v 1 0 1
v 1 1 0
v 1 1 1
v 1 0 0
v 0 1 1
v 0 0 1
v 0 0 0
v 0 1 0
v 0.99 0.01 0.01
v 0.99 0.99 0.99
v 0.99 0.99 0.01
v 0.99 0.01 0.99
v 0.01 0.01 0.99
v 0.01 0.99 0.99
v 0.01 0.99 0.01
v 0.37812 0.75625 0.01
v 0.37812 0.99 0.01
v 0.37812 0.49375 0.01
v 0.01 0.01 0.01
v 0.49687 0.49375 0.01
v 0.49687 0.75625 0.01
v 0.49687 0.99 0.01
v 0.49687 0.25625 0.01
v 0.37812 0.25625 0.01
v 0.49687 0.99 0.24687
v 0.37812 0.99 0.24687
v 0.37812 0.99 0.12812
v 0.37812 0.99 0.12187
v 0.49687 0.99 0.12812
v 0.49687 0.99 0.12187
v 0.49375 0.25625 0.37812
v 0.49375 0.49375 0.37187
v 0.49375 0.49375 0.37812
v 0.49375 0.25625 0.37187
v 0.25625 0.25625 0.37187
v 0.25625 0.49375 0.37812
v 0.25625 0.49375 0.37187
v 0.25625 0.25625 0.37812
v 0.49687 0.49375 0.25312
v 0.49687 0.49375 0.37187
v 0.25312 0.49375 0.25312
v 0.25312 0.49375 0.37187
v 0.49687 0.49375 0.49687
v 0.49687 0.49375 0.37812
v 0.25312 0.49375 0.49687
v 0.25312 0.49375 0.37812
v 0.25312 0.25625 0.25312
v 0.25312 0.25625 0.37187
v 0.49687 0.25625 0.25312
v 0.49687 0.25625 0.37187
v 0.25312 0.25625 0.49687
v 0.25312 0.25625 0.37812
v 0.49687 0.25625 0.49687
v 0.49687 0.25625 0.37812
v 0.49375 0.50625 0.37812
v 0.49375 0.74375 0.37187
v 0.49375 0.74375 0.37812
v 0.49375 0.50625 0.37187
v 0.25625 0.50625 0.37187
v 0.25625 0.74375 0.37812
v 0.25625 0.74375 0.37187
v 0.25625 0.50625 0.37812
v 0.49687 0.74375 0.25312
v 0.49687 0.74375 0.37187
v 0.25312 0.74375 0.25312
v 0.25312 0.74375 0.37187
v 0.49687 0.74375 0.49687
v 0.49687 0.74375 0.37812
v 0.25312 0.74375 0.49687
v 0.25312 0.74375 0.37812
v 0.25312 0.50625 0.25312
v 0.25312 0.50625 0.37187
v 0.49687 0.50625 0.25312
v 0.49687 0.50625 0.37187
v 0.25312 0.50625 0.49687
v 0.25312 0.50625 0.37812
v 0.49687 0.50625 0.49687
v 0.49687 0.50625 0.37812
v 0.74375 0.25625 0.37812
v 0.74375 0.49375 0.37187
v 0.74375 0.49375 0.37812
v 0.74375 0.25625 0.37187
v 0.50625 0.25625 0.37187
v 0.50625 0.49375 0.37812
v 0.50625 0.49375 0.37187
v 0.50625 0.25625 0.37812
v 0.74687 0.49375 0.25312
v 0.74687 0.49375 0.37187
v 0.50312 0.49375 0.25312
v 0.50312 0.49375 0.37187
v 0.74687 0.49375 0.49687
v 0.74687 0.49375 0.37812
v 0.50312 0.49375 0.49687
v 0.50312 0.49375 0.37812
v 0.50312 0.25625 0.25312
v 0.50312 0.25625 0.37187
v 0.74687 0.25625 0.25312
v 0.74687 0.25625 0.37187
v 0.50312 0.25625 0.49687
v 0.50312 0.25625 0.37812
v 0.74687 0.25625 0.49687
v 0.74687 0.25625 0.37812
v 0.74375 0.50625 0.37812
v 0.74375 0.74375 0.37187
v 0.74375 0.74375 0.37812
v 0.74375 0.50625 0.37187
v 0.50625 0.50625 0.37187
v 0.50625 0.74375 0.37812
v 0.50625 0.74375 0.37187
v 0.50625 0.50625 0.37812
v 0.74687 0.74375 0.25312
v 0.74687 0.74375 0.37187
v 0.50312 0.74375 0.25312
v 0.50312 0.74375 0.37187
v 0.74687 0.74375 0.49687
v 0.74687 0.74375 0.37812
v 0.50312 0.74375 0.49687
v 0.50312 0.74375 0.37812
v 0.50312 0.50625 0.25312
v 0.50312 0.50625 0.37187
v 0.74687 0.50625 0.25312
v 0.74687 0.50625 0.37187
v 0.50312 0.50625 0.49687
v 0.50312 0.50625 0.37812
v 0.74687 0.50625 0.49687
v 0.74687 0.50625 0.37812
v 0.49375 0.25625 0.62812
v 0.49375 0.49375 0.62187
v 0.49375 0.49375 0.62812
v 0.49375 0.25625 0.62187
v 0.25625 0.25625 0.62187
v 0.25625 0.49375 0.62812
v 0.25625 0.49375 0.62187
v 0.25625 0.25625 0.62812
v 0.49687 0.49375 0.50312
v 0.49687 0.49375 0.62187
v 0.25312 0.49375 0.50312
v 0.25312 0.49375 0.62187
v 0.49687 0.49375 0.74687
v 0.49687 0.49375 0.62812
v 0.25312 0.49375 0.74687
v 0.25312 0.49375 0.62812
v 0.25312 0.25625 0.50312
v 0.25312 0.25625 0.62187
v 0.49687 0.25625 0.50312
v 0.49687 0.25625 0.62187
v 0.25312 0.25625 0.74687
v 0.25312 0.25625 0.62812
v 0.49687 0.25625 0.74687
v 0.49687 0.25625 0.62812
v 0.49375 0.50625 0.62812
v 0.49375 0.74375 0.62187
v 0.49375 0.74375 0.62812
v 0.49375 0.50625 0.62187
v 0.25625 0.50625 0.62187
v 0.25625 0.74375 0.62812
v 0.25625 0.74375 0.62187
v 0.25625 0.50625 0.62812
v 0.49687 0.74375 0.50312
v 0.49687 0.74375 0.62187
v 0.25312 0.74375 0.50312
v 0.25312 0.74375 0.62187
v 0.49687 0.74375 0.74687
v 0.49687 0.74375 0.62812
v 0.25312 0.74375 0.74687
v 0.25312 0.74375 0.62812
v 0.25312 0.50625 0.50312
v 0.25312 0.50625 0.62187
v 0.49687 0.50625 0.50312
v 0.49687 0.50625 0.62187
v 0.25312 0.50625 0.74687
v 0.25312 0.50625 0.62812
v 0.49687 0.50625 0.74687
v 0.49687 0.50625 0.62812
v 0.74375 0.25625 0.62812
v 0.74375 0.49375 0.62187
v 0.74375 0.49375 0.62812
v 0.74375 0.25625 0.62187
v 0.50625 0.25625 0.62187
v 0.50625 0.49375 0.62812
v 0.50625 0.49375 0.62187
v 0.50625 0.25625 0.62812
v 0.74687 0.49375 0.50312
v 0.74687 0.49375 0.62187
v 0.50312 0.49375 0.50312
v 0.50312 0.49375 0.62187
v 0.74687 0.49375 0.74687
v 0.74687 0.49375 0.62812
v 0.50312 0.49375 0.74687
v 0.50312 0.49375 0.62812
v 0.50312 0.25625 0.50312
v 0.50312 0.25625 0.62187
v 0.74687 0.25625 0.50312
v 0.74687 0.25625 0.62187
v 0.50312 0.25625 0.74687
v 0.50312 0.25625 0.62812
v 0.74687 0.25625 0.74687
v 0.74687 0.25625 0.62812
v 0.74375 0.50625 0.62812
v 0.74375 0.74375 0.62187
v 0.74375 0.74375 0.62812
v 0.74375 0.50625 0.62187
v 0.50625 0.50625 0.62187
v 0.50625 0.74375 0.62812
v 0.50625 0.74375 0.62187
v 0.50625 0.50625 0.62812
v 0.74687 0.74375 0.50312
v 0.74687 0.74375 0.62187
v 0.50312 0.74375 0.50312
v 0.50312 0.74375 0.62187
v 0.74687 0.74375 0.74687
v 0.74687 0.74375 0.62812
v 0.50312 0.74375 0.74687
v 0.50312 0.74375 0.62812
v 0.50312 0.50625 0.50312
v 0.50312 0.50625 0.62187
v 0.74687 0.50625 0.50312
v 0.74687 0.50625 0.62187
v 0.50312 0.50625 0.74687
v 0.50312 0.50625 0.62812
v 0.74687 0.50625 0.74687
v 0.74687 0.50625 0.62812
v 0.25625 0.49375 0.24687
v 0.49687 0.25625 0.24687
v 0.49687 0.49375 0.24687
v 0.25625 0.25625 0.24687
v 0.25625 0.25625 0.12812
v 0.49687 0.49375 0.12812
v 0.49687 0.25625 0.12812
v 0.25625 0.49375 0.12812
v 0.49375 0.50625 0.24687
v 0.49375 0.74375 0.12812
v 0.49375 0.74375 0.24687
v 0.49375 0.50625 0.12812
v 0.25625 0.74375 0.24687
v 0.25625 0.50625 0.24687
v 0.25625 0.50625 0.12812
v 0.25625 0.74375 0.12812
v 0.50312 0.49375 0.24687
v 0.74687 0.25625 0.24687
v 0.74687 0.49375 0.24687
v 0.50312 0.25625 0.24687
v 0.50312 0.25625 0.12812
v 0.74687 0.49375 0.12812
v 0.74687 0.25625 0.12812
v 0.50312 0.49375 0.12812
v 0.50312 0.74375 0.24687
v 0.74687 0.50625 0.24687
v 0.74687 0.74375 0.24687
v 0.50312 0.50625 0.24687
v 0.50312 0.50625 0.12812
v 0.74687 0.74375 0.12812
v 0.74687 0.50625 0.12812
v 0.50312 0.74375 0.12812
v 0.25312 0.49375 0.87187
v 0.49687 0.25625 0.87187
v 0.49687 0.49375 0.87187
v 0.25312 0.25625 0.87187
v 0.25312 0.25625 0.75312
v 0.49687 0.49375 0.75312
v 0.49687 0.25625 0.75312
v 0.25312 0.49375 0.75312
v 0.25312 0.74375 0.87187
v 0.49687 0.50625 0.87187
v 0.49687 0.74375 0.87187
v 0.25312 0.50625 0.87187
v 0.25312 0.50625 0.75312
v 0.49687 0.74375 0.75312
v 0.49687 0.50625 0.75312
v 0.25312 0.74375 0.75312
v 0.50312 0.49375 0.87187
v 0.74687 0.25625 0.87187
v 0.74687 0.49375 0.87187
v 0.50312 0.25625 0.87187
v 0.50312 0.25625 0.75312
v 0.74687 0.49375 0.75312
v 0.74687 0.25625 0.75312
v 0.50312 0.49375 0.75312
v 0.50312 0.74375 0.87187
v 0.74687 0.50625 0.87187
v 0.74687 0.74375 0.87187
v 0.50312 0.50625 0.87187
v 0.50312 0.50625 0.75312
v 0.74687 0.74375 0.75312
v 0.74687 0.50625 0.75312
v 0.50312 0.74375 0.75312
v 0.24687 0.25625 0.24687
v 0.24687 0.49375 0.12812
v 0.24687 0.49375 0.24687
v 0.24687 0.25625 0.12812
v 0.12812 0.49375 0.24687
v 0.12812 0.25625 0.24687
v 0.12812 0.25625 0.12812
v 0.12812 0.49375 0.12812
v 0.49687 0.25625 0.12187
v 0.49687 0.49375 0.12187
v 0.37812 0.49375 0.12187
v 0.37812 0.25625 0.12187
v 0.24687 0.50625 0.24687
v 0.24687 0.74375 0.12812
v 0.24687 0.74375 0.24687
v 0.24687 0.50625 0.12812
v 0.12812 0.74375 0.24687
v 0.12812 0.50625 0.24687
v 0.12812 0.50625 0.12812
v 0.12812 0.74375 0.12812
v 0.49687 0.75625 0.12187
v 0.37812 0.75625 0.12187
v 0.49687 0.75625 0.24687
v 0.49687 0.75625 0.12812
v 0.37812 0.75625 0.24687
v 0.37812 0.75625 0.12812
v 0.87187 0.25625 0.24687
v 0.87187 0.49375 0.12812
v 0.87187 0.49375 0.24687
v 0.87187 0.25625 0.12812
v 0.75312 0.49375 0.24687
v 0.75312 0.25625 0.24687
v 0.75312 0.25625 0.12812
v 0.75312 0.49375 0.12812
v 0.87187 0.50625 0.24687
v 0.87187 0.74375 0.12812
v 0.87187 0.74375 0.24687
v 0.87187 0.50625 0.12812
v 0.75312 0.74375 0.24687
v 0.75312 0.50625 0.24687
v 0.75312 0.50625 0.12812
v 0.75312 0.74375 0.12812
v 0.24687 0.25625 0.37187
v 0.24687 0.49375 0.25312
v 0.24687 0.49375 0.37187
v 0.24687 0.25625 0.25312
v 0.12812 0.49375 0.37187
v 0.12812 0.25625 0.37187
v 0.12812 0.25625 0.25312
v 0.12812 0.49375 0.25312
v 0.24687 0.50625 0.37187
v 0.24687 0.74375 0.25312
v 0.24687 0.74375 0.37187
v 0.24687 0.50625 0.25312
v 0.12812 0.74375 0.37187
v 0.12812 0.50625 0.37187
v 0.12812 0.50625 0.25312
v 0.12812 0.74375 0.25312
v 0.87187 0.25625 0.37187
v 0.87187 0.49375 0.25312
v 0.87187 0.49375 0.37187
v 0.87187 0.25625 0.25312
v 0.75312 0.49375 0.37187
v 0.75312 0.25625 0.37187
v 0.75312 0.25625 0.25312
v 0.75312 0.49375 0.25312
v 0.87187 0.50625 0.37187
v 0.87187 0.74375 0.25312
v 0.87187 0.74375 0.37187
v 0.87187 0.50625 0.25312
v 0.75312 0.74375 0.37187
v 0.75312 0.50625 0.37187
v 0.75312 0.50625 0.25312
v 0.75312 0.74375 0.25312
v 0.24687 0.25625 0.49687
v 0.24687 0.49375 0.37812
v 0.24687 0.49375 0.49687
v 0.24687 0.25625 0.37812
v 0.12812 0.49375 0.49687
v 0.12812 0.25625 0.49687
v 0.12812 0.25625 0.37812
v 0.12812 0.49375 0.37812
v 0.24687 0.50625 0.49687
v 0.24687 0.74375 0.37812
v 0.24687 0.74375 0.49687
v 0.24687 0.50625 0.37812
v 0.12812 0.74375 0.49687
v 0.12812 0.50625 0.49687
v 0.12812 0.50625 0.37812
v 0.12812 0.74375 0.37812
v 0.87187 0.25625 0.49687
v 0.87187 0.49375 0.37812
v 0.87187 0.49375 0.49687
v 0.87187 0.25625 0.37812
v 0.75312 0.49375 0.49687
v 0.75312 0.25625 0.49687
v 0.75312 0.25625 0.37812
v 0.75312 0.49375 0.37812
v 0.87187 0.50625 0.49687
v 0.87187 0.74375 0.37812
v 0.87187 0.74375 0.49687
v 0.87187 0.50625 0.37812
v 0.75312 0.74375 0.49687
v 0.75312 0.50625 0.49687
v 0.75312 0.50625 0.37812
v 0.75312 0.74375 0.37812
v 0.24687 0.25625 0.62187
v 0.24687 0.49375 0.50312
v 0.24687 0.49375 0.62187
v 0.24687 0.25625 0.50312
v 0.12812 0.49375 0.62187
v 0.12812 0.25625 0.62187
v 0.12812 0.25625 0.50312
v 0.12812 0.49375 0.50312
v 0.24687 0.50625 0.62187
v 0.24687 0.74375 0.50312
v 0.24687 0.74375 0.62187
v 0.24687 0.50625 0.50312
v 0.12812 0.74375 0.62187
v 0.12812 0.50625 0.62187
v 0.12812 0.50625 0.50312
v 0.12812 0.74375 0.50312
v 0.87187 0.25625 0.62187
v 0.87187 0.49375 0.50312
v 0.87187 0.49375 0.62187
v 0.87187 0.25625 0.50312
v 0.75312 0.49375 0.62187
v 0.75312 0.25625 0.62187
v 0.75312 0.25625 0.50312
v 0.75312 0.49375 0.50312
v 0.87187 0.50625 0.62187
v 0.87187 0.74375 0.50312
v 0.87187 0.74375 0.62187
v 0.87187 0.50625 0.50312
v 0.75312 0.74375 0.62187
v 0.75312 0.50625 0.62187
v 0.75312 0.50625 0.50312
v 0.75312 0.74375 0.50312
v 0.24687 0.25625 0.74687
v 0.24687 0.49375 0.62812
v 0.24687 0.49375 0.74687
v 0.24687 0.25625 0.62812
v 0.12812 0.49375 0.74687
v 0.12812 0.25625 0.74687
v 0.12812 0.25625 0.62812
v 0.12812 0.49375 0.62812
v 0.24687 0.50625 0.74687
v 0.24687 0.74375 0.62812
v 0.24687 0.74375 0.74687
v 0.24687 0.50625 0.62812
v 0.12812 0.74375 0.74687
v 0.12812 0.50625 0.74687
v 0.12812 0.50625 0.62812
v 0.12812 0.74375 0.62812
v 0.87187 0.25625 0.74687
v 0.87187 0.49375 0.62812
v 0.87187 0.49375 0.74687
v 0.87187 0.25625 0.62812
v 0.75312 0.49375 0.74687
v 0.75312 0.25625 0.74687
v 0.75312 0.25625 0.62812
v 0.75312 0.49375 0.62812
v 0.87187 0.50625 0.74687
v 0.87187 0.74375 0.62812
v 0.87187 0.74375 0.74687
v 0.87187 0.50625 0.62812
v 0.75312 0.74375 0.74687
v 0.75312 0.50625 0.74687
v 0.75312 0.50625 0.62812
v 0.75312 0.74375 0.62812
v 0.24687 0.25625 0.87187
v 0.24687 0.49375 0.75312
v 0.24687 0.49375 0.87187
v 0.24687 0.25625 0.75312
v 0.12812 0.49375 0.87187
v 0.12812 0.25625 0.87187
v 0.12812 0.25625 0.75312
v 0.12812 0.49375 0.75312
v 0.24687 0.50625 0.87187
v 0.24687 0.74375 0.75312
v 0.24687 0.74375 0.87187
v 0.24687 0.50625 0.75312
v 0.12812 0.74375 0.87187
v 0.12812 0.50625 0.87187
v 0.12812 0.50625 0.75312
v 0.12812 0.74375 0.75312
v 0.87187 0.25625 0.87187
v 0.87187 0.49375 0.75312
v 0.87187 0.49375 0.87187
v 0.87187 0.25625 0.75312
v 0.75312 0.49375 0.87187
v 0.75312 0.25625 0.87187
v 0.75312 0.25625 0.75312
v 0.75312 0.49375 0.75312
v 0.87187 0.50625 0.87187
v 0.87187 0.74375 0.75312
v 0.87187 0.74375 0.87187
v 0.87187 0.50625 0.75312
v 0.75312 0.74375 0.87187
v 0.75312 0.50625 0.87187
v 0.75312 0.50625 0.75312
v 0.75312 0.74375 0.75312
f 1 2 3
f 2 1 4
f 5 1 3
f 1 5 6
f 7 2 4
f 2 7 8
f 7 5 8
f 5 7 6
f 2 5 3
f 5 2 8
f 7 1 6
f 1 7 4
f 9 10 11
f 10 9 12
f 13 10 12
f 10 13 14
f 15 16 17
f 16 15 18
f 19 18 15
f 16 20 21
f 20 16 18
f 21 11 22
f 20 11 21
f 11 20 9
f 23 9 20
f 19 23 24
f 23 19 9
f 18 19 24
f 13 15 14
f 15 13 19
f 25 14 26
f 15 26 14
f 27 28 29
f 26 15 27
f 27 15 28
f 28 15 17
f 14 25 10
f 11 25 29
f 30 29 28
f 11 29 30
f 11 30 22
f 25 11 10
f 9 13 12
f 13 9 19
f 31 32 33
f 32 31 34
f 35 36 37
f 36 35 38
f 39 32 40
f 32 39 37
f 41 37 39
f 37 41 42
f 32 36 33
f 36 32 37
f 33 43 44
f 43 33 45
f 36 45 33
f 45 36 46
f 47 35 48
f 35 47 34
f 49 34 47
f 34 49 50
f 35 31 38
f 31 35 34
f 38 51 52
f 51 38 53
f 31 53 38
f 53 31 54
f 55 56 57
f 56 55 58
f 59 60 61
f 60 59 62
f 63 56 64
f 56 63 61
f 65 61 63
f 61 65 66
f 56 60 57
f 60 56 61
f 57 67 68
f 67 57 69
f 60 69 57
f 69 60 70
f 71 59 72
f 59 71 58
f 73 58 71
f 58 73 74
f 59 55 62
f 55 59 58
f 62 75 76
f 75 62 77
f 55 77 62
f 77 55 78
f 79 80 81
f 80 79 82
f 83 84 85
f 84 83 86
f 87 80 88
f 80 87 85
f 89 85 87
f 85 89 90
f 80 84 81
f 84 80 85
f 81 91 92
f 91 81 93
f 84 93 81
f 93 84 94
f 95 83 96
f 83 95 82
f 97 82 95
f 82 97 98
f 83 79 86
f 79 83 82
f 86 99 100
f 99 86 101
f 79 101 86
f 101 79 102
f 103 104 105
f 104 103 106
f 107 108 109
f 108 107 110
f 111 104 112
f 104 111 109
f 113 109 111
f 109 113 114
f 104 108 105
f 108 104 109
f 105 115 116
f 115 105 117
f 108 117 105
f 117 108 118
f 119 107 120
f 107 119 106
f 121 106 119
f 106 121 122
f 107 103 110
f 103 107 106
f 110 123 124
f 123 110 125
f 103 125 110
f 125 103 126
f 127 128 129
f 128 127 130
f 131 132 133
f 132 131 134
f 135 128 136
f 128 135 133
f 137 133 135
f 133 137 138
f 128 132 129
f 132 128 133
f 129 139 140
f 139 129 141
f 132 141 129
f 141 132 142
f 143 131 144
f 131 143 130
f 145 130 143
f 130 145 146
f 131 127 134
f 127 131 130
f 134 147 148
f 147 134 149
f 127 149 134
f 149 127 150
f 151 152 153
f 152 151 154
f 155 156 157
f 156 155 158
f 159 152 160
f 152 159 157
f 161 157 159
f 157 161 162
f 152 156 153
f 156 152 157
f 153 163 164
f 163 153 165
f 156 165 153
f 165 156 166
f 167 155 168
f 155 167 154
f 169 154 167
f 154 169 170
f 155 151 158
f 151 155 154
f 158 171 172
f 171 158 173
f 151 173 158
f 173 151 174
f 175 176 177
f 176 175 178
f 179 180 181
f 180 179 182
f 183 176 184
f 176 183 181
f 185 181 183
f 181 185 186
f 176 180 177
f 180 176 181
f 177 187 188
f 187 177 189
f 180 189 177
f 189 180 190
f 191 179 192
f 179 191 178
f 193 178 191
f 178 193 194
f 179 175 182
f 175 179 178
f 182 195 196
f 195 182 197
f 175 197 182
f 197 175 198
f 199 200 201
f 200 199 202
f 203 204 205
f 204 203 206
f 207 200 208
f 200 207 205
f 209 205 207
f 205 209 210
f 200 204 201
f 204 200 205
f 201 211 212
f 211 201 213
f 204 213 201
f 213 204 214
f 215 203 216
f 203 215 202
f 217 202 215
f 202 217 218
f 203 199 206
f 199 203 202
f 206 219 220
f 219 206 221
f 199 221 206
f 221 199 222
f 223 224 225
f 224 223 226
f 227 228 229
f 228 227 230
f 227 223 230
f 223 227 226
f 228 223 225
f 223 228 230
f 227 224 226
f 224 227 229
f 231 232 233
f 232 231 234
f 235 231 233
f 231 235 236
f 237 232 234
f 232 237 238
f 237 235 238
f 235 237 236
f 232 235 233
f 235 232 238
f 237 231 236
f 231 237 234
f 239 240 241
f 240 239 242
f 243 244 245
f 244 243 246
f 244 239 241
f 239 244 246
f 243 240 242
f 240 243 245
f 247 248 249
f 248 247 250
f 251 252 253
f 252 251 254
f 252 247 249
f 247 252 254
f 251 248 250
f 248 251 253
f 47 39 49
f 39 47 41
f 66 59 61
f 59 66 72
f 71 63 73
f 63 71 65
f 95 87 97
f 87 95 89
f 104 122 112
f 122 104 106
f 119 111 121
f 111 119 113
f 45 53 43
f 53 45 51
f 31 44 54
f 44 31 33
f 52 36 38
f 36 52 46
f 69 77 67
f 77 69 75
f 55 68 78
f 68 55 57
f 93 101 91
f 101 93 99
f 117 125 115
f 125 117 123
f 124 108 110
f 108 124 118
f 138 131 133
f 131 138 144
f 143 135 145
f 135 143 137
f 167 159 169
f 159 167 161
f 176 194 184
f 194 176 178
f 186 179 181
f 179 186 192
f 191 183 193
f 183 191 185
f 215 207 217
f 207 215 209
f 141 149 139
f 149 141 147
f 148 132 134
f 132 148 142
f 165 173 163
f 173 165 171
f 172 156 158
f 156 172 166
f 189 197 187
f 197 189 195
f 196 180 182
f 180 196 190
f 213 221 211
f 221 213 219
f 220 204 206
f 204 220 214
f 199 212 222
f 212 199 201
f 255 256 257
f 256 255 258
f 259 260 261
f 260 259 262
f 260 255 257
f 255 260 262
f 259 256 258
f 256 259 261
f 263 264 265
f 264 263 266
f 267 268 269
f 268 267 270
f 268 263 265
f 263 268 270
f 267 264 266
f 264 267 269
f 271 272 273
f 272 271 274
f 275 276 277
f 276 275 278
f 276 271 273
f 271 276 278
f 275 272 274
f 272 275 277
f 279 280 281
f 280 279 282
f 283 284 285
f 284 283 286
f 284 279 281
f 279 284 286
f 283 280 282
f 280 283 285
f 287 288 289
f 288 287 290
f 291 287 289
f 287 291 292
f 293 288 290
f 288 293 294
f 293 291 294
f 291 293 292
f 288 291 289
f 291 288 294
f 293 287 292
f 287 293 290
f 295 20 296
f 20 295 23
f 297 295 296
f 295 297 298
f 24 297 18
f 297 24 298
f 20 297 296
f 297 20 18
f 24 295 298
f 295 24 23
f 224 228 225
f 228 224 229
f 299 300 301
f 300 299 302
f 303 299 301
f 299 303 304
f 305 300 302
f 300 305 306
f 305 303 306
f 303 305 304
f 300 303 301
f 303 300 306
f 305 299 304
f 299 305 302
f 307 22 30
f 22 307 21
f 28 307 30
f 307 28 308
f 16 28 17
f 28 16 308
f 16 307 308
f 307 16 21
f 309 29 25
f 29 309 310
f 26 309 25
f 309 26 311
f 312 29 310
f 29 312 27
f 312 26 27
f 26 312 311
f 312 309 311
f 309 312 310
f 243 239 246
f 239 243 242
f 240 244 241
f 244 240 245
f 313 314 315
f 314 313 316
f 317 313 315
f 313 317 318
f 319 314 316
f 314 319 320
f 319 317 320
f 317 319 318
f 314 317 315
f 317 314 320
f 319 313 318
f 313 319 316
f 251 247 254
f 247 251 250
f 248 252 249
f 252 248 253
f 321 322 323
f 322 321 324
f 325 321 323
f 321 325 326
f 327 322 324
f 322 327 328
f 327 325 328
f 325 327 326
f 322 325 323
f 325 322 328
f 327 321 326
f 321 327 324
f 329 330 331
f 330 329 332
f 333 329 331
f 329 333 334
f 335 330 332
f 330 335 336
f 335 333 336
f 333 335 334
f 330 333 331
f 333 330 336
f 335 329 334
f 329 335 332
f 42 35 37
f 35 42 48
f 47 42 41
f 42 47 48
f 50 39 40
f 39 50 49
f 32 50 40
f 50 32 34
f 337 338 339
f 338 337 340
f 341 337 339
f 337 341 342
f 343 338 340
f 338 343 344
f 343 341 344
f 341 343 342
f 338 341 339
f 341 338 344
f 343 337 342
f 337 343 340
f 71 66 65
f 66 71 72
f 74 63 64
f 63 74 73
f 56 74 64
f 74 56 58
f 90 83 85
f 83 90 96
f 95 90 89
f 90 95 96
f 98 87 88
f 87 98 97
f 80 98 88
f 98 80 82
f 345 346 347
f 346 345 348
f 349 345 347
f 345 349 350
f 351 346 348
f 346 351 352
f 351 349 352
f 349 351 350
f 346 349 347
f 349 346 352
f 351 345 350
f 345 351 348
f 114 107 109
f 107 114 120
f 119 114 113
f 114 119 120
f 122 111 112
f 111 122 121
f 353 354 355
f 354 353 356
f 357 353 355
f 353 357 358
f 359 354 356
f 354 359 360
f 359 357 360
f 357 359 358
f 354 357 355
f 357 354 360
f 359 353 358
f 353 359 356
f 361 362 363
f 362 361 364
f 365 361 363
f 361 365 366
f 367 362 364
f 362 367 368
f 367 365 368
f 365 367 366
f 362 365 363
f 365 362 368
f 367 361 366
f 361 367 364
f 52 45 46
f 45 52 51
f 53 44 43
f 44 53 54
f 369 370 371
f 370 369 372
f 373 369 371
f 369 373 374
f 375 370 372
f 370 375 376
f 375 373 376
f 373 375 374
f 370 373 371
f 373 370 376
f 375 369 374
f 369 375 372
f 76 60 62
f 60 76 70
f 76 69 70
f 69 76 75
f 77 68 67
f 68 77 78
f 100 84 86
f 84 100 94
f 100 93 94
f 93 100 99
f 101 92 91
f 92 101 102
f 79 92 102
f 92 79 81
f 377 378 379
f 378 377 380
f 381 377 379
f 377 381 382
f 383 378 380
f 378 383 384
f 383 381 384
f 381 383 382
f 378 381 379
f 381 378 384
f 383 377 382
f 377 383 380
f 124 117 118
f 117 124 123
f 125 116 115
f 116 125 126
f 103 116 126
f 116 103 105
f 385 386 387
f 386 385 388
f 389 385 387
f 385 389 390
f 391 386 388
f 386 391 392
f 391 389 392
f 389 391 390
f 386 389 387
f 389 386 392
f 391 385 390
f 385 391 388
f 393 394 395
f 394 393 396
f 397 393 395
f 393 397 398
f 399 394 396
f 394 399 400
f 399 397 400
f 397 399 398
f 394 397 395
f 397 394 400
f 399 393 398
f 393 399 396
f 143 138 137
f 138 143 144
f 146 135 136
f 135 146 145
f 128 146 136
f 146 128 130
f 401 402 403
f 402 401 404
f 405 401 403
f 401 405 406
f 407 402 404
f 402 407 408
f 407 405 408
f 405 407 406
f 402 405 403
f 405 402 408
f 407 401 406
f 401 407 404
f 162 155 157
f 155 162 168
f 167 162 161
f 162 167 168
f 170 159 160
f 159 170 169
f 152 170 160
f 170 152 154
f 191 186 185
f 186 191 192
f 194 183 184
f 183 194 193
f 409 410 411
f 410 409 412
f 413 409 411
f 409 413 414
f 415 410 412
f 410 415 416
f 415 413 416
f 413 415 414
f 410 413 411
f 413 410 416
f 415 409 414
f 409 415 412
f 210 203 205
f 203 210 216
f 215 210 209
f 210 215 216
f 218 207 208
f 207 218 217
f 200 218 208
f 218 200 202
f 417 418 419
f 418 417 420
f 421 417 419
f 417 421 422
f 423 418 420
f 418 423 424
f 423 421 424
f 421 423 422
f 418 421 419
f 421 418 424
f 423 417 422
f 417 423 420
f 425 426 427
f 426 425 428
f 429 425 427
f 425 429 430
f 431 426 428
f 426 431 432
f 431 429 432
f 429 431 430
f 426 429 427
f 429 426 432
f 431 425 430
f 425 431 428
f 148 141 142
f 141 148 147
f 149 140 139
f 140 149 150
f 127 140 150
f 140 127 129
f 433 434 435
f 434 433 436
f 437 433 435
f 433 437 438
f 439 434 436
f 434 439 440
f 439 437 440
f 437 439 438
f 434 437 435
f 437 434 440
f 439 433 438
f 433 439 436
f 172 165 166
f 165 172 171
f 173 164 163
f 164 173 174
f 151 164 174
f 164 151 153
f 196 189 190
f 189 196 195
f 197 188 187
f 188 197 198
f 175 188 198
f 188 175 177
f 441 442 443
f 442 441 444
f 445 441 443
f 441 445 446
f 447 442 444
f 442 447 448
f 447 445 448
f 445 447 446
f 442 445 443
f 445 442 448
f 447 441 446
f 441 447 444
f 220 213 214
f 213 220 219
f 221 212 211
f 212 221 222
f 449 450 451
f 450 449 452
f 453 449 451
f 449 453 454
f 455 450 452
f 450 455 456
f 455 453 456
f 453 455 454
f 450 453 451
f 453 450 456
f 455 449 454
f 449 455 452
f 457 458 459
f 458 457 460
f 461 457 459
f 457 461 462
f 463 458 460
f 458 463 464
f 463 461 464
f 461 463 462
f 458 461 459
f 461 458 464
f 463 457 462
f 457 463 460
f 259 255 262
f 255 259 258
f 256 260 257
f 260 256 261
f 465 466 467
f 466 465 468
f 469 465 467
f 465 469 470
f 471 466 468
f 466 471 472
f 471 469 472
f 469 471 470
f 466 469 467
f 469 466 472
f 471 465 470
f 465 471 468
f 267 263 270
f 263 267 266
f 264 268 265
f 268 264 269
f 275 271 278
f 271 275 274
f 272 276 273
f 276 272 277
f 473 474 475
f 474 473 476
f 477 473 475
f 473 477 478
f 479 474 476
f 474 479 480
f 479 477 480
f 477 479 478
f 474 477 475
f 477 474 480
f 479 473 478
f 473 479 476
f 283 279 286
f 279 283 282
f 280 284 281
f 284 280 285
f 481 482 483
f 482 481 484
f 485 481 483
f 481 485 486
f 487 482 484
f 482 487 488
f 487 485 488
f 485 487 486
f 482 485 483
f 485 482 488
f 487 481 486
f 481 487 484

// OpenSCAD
translate([0.375, 0.375, 0.375]) color([0.3519350680925015, 0.6477014615427978, 0.14125726454845833]) cube([0.2375, 0.2375, 0.2375], center=true);
translate([0.375, 0.625, 0.375]) color([0.23013900541024712, 0.8285218163248013, 0.9603761550286747]) cube([0.2375, 0.2375, 0.2375], center=true);
translate([0.625, 0.375, 0.375]) color([0.6050710034948523, 0.017553655236826726, 0.43262871278032167]) cube([0.2375, 0.2375, 0.2375], center=true);
translate([0.625, 0.625, 0.375]) color([0.2571490251669072, 0.4480229944680496, 0.14517873337393172]) cube([0.2375, 0.2375, 0.2375], center=true);
translate([0.375, 0.375, 0.625]) color([0.8405131005933094, 0.9776834869331054, 0.10300019528175153]) cube([0.2375, 0.2375, 0.2375], center=true);
translate([0.375, 0.625, 0.625]) color([0.998153073210626, 0.8535026464000083, 0.6855970549077809]) cube([0.2375, 0.2375, 0.2375], center=true);
translate([0.625, 0.375, 0.625]) color([0.7995005100691247, 0.34047238184459006, 0.1286635278612125]) cube([0.2375, 0.2375, 0.2375], center=true);
translate([0.625, 0.625, 0.625]) color([0.6020598448119898, 0.9167847797194366, 0.02081986636819022]) cube([0.2375, 0.2375, 0.2375], center=true);
translate([0.375, 0.375, 0.1875]) color([0.9135118305629362, 0.3823609034395232, 0.42581309278619206]) cube([0.2375, 0.2375, 0.11875], center=true);
translate([0.375, 0.625, 0.1875]) color([0.08967296065919184, 0.0016857337534631478, 0.31287848776698257]) cube([0.2375, 0.2375, 0.11875], center=true);
translate([0.625, 0.375, 0.1875]) color([0.09731792302828757, 0.364404074066101, 0.8754307508322564]) cube([0.2375, 0.2375, 0.11875], center=true);
translate([0.625, 0.625, 0.1875]) color([0.6967090939923642, 0.5776053806129825, 0.18685318159950626]) cube([0.2375, 0.2375, 0.11875], center=true);
translate([0.375, 0.375, 0.3125]) color([0.9585806736472646, 0.593334846568766, 0.09927504601217696]) cube([0.2375, 0.2375, 0.11875], center=true);
translate([0.375, 0.625, 0.3125]) color([0.19313665173925, 0.6863688301261038, 0.2093263356404984]) cube([0.2375, 0.2375, 0.11875], center=true);
translate([0.625, 0.375, 0.3125]) color([0.2694340379225941, 0.24598969558588324, 0.16092298384524362]) cube([0.2375, 0.2375, 0.11875], center=true);
translate([0.625, 0.625, 0.3125]) color([0.5102606956149307, 0.431705445139412, 0.38909399282504675]) cube([0.2375, 0.2375, 0.11875], center=true);
translate([0.375, 0.375, 0.4375]) color([0.3194819673674283, 0.6655357355223767, 0.22692357675811492]) cube([0.2375, 0.2375, 0.11875], center=true);
translate([0.375, 0.625, 0.4375]) color([0.9464906820257937, 0.35776616524050997, 0.9421064453260054]) cube([0.2375, 0.2375, 0.11875], center=true);
translate([0.625, 0.375, 0.4375]) color([0.3792404853118415, 0.27508202782836655, 0.9368074710650367]) cube([0.2375, 0.2375, 0.11875], center=true);
translate([0.625, 0.625, 0.4375]) color([0.7670397757471089, 0.17483880300164423, 0.7474114244696689]) cube([0.2375, 0.2375, 0.11875], center=true);
translate([0.375, 0.375, 0.5625]) color([0.6015236368594579, 0.5872808850844162, 0.28390336255679416]) cube([0.2375, 0.2375, 0.11875], center=true);
translate([0.375, 0.625, 0.5625]) color([0.5839405385485582, 0.4048698908705002, 0.6877557316706271]) cube([0.2375, 0.2375, 0.11875], center=true);
translate([0.625, 0.375, 0.5625]) color([0.29310936231965135, 0.08456113000314536, 0.6409271470126323]) cube([0.2375, 0.2375, 0.11875], center=true);
translate([0.625, 0.625, 0.5625]) color([0.38512246522478266, 0.6162859510128613, 0.407224705538046]) cube([0.2375, 0.2375, 0.11875], center=true);
translate([0.375, 0.375, 0.6875]) color([0.6107800780239486, 0.9541913078580654, 0.09369719926319908]) cube([0.2375, 0.2375, 0.11875], center=true);
translate([0.375, 0.625, 0.6875]) color([0.4396226851829427, 0.9817497074141792, 0.30111933510979894]) cube([0.2375, 0.2375, 0.11875], center=true);
translate([0.625, 0.375, 0.6875]) color([0.08571041628526821, 0.691130580335744, 0.16573157374072334]) cube([0.2375, 0.2375, 0.11875], center=true);
translate([0.625, 0.625, 0.6875]) color([0.4668304924867862, 0.30100213617539295, 0.3511677492745029]) cube([0.2375, 0.2375, 0.11875], center=true);
translate([0.375, 0.375, 0.8125]) color([0.05564944269037686, 0.7696481469448815, 0.686275624239137]) cube([0.2375, 0.2375, 0.11875], center=true);
translate([0.375, 0.625, 0.8125]) color([0.15447252119296884, 0.35335085758162643, 0.18799175914388588]) cube([0.2375, 0.2375, 0.11875], center=true);
translate([0.625, 0.375, 0.8125]) color([0.41322879780265653, 0.82270842281296, 0.9057146612667819]) cube([0.2375, 0.2375, 0.11875], center=true);
translate([0.625, 0.625, 0.8125]) color([0.9688547633127277, 0.5528378273263655, 0.12760284187612392]) cube([0.2375, 0.2375, 0.11875], center=true);
translate([0.1875, 0.375, 0.1875]) color([0.1710979555253146, 0.7131998843266452, 0.6397779425125977]) cube([0.11875, 0.2375, 0.11875], center=true);
translate([0.4375, 0.375, 0.0625]) color([0.57496968906483, 0.8489371230716904, 0.07944838941339594]) cube([0.11875, 0.2375, 0.11875], center=true);
translate([0.4375, 0.375, 0.1875]) color([0.040333123224873146, 0.9305910632054132, 0.3080440975445232]) cube([0.11875, 0.2375, 0.11875], center=true);
translate([0.1875, 0.625, 0.1875]) color([0.6084655882345898, 0.4923441190446234, 0.7069385087242315]) cube([0.11875, 0.2375, 0.11875], center=true);
translate([0.4375, 0.875, 0.0625]) color([0.6803385961846494, 0.18024793645131376, 0.10787678186317007]) cube([0.11875, 0.2375, 0.11875], center=true);
translate([0.4375, 0.875, 0.1875]) color([0.1335624130282893, 0.47731112778056706, 0.8393950916733898]) cube([0.11875, 0.2375, 0.11875], center=true);
translate([0.5625, 0.375, 0.1875]) color([0.6780893207968227, 0.08337096158279222, 0.27725115680544954]) cube([0.11875, 0.2375, 0.11875], center=true);
translate([0.6875, 0.375, 0.1875]) color([0.9965791662073833, 0.03375154870506614, 0.10494976972159242]) cube([0.11875, 0.2375, 0.11875], center=true);
translate([0.8125, 0.375, 0.1875]) color([0.516844917539197, 0.1360610465034362, 0.543805910213663]) cube([0.11875, 0.2375, 0.11875], center=true);
translate([0.5625, 0.625, 0.1875]) color([0.04901628196141694, 0.4867102513994055, 0.8813892002857401]) cube([0.11875, 0.2375, 0.11875], center=true);
translate([0.6875, 0.625, 0.1875]) color([0.3053751014353143, 0.40772022041766365, 0.31297204198076634]) cube([0.11875, 0.2375, 0.11875], center=true);
translate([0.8125, 0.625, 0.1875]) color([0.49907796034366436, 0.6160709555012981, 0.9916538905911245]) cube([0.11875, 0.2375, 0.11875], center=true);
translate([0.1875, 0.375, 0.3125]) color([0.3123575451593331, 0.46364206475662195, 0.8862899719975306]) cube([0.11875, 0.2375, 0.11875], center=true);
translate([0.3125, 0.375, 0.3125]) color([0.5738800220993816, 0.8494037217359881, 0.24323676398212035]) cube([0.11875, 0.2375, 0.11875], center=true);
translate([0.4375, 0.375, 0.3125]) color([0.8402878098664139, 0.9530478541805099, 0.16594803365564914]) cube([0.11875, 0.2375, 0.11875], center=true);
translate([0.1875, 0.625, 0.3125]) color([0.0023370868964924796, 0.7387895340607371, 0.5374530602666081]) cube([0.11875, 0.2375, 0.11875], center=true);
translate([0.3125, 0.625, 0.3125]) color([0.25604025835089217, 0.4320068924153808, 0.5112453323210508]) cube([0.11875, 0.2375, 0.11875], center=true);
translate([0.4375, 0.625, 0.3125]) color([0.7462272619347637, 0.5039790716190428, 0.8850839351693509]) cube([0.11875, 0.2375, 0.11875], center=true);
translate([0.5625, 0.375, 0.3125]) color([0.6652757233710683, 0.22263754843686523, 0.08942086350367451]) cube([0.11875, 0.2375, 0.11875], center=true);
translate([0.6875, 0.375, 0.3125]) color([0.6195232841458308, 0.9036720387350747, 0.7222923954673625]) cube([0.11875, 0.2375, 0.11875], center=true);
translate([0.8125, 0.375, 0.3125]) color([0.6665075097113882, 0.5421139713900744, 0.6943978877819516]) cube([0.11875, 0.2375, 0.11875], center=true);
translate([0.5625, 0.625, 0.3125]) color([0.9269770591996176, 0.12480324665016229, 0.8422397758241813]) cube([0.11875, 0.2375, 0.11875], center=true);
translate([0.6875, 0.625, 0.3125]) color([0.028249143050612435, 0.8554899328562455, 0.6212809598996976]) cube([0.11875, 0.2375, 0.11875], center=true);
translate([0.8125, 0.625, 0.3125]) color([0.6435486749275994, 0.4857227915978113, 0.2898251547629681]) cube([0.11875, 0.2375, 0.11875], center=true);
translate([0.1875, 0.375, 0.4375]) color([0.21709076393122206, 0.4979948584580751, 0.6176241526046676]) cube([0.11875, 0.2375, 0.11875], center=true);
translate([0.3125, 0.375, 0.4375]) color([0.4722249532281336, 0.7228331534363125, 0.6109414561657331]) cube([0.11875, 0.2375, 0.11875], center=true);
translate([0.4375, 0.375, 0.4375]) color([0.5330085163671737, 0.6769359871291822, 0.5973748769978083]) cube([0.11875, 0.2375, 0.11875], center=true);
translate([0.1875, 0.625, 0.4375]) color([0.14460255854654236, 0.21273280877313017, 0.8417179364881341]) cube([0.11875, 0.2375, 0.11875], center=true);
translate([0.3125, 0.625, 0.4375]) color([0.6300391880279899, 0.5103677782275869, 0.4479627161837708]) cube([0.11875, 0.2375, 0.11875], center=true);
translate([0.4375, 0.625, 0.4375]) color([0.2903518628620462, 0.1744676713524972, 0.5457372127765215]) cube([0.11875, 0.2375, 0.11875], center=true);
translate([0.5625, 0.375, 0.4375]) color([0.6340658375422632, 0.7004271366493812, 0.690956934786038]) cube([0.11875, 0.2375, 0.11875], center=true);
translate([0.6875, 0.375, 0.4375]) color([0.013948469234104865, 0.8018456354370093, 0.2607079205191076]) cube([0.11875, 0.2375, 0.11875], center=true);
translate([0.8125, 0.375, 0.4375]) color([0.01899716010339858, 0.7507132946374245, 0.44168653561511173]) cube([0.11875, 0.2375, 0.11875], center=true);
translate([0.5625, 0.625, 0.4375]) color([0.1668653701245908, 0.45955837321901094, 0.7876756969907556]) cube([0.11875, 0.2375, 0.11875], center=true);
translate([0.6875, 0.625, 0.4375]) color([0.09564527702692727, 0.06733136152719421, 0.7816649665975636]) cube([0.11875, 0.2375, 0.11875], center=true);
translate([0.8125, 0.625, 0.4375]) color([0.030385075649315252, 0.33346286891595733, 0.08647112242809318]) cube([0.11875, 0.2375, 0.11875], center=true);
translate([0.1875, 0.375, 0.5625]) color([0.8161439782233904, 0.05657658467482607, 0.8243668117903717]) cube([0.11875, 0.2375, 0.11875], center=true);
translate([0.3125, 0.375, 0.5625]) color([0.05808931884644186, 0.6181904095369413, 0.1426995958976538]) cube([0.11875, 0.2375, 0.11875], center=true);
translate([0.4375, 0.375, 0.5625]) color([0.3846464495954227, 0.3794414211645075, 0.7643773332264734]) cube([0.11875, 0.2375, 0.11875], center=true);
translate([0.1875, 0.625, 0.5625]) color([0.3116889002403487, 0.7690158776827113, 0.7674729074453902]) cube([0.11875, 0.2375, 0.11875], center=true);
translate([0.3125, 0.625, 0.5625]) color([0.3394448706328078, 0.45855440081433096, 0.0007502935671159783]) cube([0.11875, 0.2375, 0.11875], center=true);
translate([0.4375, 0.625, 0.5625]) color([0.8084995756647368, 0.0331322283588068, 0.9954935019736515]) cube([0.11875, 0.2375, 0.11875], center=true);
translate([0.5625, 0.375, 0.5625]) color([0.32750610520168044, 0.511786711221762, 0.09639677946248049]) cube([0.11875, 0.2375, 0.11875], center=true);
translate([0.6875, 0.375, 0.5625]) color([0.46647601470953737, 0.043404226035316795, 0.8089506697449751]) cube([0.11875, 0.2375, 0.11875], center=true);
translate([0.8125, 0.375, 0.5625]) color([0.9065579579370614, 0.48874197586323487, 0.4689182776921319]) cube([0.11875, 0.2375, 0.11875], center=true);
translate([0.5625, 0.625, 0.5625]) color([0.9999833648369341, 0.42392948264922625, 0.11056216143511133]) cube([0.11875, 0.2375, 0.11875], center=true);
translate([0.6875, 0.625, 0.5625]) color([0.5007484231317689, 0.23725843071495933, 0.7435751616565288]) cube([0.11875, 0.2375, 0.11875], center=true);
translate([0.8125, 0.625, 0.5625]) color([0.030326511183225713, 0.9534383365251057, 0.44454391677925087]) cube([0.11875, 0.2375, 0.11875], center=true);
translate([0.1875, 0.375, 0.6875]) color([0.4017260225039573, 0.6984802625757133, 0.14751428227125585]) cube([0.11875, 0.2375, 0.11875], center=true);
translate([0.3125, 0.375, 0.6875]) color([0.592053202978914, 0.7602792343344718, 0.23214841748979886]) cube([0.11875, 0.2375, 0.11875], center=true);
translate([0.4375, 0.375, 0.6875]) color([0.2215781656479593, 0.24536616409996503, 0.7021925659500807]) cube([0.11875, 0.2375, 0.11875], center=true);
translate([0.1875, 0.625, 0.6875]) color([0.5457605096294114, 0.54011508338913, 0.5459453680001618]) cube([0.11875, 0.2375, 0.11875], center=true);
translate([0.3125, 0.625, 0.6875]) color([0.21439919344985514, 0.4167057873106884, 0.6193494045718565]) cube([0.11875, 0.2375, 0.11875], center=true);
translate([0.4375, 0.625, 0.6875]) color([0.45760594266221877, 0.8933837090972113, 0.8109172526149769]) cube([0.11875, 0.2375, 0.11875], center=true);
translate([0.5625, 0.375, 0.6875]) color([0.14833972802097417, 0.6068004170768148, 0.5080529466064481]) cube([0.11875, 0.2375, 0.11875], center=true);
translate([0.6875, 0.375, 0.6875]) color([0.9906187087676633, 0.11352393843166497, 0.6883720652754897]) cube([0.11875, 0.2375, 0.11875], center=true);
translate([0.8125, 0.375, 0.6875]) color([0.5952346609945763, 0.6540807806784664, 0.3474259839548979]) cube([0.11875, 0.2375, 0.11875], center=true);
translate([0.5625, 0.625, 0.6875]) color([0.9928586924360654, 0.247192741454632, 0.70975753974483]) cube([0.11875, 0.2375, 0.11875], center=true);
translate([0.6875, 0.625, 0.6875]) color([0.13794757021236903, 0.4611444179186315, 0.04899626755467579]) cube([0.11875, 0.2375, 0.11875], center=true);
translate([0.8125, 0.625, 0.6875]) color([0.1977229983916683, 0.036370797334404625, 0.13840798504488894]) cube([0.11875, 0.2375, 0.11875], center=true);
translate([0.1875, 0.375, 0.8125]) color([0.695134065044521, 0.2654011745990712, 0.4635417367699751]) cube([0.11875, 0.2375, 0.11875], center=true);
translate([0.3125, 0.375, 0.8125]) color([0.14067843926211876, 0.3233092624720053, 0.6766209265725885]) cube([0.11875, 0.2375, 0.11875], center=true);
translate([0.4375, 0.375, 0.8125]) color([0.5598941248919586, 0.2674263193966361, 0.7715367321750608]) cube([0.11875, 0.2375, 0.11875], center=true);
translate([0.1875, 0.625, 0.8125]) color([0.7775867750177572, 0.3358457771023752, 0.7984986383285079]) cube([0.11875, 0.2375, 0.11875], center=true);
translate([0.3125, 0.625, 0.8125]) color([0.3608344962449672, 0.130636609727118, 0.1470050456404287]) cube([0.11875, 0.2375, 0.11875], center=true);
translate([0.4375, 0.625, 0.8125]) color([0.5817121628313788, 0.46286602772829477, 0.8824527290015699]) cube([0.11875, 0.2375, 0.11875], center=true);
translate([0.5625, 0.375, 0.8125]) color([0.1201105517589024, 0.1938197880719691, 0.4695931850983104]) cube([0.11875, 0.2375, 0.11875], center=true);
translate([0.6875, 0.375, 0.8125]) color([0.14078313852784263, 0.6451769219884874, 0.9811903017448982]) cube([0.11875, 0.2375, 0.11875], center=true);
translate([0.8125, 0.375, 0.8125]) color([0.8740229692652243, 0.6541461711493592, 0.21289315855754942]) cube([0.11875, 0.2375, 0.11875], center=true);
translate([0.5625, 0.625, 0.8125]) color([0.9328418457966335, 0.42345059226773774, 0.5012376899041451]) cube([0.11875, 0.2375, 0.11875], center=true);
translate([0.6875, 0.625, 0.8125]) color([0.5811541702347708, 0.2791891573101454, 0.2092311813057095]) cube([0.11875, 0.2375, 0.11875], center=true);
translate([0.8125, 0.625, 0.8125]) color([0.9628933046967749, 0.6198760626942967, 0.5999578261672418]) cube([0.11875, 0.2375, 0.11875], center=true);
color([0.3,0.3,0.3,0.3]) difference() { cube([1,1,1]); translate([0.01,0.01,0.01]) cube([0.98,0.98,0.98]); }
